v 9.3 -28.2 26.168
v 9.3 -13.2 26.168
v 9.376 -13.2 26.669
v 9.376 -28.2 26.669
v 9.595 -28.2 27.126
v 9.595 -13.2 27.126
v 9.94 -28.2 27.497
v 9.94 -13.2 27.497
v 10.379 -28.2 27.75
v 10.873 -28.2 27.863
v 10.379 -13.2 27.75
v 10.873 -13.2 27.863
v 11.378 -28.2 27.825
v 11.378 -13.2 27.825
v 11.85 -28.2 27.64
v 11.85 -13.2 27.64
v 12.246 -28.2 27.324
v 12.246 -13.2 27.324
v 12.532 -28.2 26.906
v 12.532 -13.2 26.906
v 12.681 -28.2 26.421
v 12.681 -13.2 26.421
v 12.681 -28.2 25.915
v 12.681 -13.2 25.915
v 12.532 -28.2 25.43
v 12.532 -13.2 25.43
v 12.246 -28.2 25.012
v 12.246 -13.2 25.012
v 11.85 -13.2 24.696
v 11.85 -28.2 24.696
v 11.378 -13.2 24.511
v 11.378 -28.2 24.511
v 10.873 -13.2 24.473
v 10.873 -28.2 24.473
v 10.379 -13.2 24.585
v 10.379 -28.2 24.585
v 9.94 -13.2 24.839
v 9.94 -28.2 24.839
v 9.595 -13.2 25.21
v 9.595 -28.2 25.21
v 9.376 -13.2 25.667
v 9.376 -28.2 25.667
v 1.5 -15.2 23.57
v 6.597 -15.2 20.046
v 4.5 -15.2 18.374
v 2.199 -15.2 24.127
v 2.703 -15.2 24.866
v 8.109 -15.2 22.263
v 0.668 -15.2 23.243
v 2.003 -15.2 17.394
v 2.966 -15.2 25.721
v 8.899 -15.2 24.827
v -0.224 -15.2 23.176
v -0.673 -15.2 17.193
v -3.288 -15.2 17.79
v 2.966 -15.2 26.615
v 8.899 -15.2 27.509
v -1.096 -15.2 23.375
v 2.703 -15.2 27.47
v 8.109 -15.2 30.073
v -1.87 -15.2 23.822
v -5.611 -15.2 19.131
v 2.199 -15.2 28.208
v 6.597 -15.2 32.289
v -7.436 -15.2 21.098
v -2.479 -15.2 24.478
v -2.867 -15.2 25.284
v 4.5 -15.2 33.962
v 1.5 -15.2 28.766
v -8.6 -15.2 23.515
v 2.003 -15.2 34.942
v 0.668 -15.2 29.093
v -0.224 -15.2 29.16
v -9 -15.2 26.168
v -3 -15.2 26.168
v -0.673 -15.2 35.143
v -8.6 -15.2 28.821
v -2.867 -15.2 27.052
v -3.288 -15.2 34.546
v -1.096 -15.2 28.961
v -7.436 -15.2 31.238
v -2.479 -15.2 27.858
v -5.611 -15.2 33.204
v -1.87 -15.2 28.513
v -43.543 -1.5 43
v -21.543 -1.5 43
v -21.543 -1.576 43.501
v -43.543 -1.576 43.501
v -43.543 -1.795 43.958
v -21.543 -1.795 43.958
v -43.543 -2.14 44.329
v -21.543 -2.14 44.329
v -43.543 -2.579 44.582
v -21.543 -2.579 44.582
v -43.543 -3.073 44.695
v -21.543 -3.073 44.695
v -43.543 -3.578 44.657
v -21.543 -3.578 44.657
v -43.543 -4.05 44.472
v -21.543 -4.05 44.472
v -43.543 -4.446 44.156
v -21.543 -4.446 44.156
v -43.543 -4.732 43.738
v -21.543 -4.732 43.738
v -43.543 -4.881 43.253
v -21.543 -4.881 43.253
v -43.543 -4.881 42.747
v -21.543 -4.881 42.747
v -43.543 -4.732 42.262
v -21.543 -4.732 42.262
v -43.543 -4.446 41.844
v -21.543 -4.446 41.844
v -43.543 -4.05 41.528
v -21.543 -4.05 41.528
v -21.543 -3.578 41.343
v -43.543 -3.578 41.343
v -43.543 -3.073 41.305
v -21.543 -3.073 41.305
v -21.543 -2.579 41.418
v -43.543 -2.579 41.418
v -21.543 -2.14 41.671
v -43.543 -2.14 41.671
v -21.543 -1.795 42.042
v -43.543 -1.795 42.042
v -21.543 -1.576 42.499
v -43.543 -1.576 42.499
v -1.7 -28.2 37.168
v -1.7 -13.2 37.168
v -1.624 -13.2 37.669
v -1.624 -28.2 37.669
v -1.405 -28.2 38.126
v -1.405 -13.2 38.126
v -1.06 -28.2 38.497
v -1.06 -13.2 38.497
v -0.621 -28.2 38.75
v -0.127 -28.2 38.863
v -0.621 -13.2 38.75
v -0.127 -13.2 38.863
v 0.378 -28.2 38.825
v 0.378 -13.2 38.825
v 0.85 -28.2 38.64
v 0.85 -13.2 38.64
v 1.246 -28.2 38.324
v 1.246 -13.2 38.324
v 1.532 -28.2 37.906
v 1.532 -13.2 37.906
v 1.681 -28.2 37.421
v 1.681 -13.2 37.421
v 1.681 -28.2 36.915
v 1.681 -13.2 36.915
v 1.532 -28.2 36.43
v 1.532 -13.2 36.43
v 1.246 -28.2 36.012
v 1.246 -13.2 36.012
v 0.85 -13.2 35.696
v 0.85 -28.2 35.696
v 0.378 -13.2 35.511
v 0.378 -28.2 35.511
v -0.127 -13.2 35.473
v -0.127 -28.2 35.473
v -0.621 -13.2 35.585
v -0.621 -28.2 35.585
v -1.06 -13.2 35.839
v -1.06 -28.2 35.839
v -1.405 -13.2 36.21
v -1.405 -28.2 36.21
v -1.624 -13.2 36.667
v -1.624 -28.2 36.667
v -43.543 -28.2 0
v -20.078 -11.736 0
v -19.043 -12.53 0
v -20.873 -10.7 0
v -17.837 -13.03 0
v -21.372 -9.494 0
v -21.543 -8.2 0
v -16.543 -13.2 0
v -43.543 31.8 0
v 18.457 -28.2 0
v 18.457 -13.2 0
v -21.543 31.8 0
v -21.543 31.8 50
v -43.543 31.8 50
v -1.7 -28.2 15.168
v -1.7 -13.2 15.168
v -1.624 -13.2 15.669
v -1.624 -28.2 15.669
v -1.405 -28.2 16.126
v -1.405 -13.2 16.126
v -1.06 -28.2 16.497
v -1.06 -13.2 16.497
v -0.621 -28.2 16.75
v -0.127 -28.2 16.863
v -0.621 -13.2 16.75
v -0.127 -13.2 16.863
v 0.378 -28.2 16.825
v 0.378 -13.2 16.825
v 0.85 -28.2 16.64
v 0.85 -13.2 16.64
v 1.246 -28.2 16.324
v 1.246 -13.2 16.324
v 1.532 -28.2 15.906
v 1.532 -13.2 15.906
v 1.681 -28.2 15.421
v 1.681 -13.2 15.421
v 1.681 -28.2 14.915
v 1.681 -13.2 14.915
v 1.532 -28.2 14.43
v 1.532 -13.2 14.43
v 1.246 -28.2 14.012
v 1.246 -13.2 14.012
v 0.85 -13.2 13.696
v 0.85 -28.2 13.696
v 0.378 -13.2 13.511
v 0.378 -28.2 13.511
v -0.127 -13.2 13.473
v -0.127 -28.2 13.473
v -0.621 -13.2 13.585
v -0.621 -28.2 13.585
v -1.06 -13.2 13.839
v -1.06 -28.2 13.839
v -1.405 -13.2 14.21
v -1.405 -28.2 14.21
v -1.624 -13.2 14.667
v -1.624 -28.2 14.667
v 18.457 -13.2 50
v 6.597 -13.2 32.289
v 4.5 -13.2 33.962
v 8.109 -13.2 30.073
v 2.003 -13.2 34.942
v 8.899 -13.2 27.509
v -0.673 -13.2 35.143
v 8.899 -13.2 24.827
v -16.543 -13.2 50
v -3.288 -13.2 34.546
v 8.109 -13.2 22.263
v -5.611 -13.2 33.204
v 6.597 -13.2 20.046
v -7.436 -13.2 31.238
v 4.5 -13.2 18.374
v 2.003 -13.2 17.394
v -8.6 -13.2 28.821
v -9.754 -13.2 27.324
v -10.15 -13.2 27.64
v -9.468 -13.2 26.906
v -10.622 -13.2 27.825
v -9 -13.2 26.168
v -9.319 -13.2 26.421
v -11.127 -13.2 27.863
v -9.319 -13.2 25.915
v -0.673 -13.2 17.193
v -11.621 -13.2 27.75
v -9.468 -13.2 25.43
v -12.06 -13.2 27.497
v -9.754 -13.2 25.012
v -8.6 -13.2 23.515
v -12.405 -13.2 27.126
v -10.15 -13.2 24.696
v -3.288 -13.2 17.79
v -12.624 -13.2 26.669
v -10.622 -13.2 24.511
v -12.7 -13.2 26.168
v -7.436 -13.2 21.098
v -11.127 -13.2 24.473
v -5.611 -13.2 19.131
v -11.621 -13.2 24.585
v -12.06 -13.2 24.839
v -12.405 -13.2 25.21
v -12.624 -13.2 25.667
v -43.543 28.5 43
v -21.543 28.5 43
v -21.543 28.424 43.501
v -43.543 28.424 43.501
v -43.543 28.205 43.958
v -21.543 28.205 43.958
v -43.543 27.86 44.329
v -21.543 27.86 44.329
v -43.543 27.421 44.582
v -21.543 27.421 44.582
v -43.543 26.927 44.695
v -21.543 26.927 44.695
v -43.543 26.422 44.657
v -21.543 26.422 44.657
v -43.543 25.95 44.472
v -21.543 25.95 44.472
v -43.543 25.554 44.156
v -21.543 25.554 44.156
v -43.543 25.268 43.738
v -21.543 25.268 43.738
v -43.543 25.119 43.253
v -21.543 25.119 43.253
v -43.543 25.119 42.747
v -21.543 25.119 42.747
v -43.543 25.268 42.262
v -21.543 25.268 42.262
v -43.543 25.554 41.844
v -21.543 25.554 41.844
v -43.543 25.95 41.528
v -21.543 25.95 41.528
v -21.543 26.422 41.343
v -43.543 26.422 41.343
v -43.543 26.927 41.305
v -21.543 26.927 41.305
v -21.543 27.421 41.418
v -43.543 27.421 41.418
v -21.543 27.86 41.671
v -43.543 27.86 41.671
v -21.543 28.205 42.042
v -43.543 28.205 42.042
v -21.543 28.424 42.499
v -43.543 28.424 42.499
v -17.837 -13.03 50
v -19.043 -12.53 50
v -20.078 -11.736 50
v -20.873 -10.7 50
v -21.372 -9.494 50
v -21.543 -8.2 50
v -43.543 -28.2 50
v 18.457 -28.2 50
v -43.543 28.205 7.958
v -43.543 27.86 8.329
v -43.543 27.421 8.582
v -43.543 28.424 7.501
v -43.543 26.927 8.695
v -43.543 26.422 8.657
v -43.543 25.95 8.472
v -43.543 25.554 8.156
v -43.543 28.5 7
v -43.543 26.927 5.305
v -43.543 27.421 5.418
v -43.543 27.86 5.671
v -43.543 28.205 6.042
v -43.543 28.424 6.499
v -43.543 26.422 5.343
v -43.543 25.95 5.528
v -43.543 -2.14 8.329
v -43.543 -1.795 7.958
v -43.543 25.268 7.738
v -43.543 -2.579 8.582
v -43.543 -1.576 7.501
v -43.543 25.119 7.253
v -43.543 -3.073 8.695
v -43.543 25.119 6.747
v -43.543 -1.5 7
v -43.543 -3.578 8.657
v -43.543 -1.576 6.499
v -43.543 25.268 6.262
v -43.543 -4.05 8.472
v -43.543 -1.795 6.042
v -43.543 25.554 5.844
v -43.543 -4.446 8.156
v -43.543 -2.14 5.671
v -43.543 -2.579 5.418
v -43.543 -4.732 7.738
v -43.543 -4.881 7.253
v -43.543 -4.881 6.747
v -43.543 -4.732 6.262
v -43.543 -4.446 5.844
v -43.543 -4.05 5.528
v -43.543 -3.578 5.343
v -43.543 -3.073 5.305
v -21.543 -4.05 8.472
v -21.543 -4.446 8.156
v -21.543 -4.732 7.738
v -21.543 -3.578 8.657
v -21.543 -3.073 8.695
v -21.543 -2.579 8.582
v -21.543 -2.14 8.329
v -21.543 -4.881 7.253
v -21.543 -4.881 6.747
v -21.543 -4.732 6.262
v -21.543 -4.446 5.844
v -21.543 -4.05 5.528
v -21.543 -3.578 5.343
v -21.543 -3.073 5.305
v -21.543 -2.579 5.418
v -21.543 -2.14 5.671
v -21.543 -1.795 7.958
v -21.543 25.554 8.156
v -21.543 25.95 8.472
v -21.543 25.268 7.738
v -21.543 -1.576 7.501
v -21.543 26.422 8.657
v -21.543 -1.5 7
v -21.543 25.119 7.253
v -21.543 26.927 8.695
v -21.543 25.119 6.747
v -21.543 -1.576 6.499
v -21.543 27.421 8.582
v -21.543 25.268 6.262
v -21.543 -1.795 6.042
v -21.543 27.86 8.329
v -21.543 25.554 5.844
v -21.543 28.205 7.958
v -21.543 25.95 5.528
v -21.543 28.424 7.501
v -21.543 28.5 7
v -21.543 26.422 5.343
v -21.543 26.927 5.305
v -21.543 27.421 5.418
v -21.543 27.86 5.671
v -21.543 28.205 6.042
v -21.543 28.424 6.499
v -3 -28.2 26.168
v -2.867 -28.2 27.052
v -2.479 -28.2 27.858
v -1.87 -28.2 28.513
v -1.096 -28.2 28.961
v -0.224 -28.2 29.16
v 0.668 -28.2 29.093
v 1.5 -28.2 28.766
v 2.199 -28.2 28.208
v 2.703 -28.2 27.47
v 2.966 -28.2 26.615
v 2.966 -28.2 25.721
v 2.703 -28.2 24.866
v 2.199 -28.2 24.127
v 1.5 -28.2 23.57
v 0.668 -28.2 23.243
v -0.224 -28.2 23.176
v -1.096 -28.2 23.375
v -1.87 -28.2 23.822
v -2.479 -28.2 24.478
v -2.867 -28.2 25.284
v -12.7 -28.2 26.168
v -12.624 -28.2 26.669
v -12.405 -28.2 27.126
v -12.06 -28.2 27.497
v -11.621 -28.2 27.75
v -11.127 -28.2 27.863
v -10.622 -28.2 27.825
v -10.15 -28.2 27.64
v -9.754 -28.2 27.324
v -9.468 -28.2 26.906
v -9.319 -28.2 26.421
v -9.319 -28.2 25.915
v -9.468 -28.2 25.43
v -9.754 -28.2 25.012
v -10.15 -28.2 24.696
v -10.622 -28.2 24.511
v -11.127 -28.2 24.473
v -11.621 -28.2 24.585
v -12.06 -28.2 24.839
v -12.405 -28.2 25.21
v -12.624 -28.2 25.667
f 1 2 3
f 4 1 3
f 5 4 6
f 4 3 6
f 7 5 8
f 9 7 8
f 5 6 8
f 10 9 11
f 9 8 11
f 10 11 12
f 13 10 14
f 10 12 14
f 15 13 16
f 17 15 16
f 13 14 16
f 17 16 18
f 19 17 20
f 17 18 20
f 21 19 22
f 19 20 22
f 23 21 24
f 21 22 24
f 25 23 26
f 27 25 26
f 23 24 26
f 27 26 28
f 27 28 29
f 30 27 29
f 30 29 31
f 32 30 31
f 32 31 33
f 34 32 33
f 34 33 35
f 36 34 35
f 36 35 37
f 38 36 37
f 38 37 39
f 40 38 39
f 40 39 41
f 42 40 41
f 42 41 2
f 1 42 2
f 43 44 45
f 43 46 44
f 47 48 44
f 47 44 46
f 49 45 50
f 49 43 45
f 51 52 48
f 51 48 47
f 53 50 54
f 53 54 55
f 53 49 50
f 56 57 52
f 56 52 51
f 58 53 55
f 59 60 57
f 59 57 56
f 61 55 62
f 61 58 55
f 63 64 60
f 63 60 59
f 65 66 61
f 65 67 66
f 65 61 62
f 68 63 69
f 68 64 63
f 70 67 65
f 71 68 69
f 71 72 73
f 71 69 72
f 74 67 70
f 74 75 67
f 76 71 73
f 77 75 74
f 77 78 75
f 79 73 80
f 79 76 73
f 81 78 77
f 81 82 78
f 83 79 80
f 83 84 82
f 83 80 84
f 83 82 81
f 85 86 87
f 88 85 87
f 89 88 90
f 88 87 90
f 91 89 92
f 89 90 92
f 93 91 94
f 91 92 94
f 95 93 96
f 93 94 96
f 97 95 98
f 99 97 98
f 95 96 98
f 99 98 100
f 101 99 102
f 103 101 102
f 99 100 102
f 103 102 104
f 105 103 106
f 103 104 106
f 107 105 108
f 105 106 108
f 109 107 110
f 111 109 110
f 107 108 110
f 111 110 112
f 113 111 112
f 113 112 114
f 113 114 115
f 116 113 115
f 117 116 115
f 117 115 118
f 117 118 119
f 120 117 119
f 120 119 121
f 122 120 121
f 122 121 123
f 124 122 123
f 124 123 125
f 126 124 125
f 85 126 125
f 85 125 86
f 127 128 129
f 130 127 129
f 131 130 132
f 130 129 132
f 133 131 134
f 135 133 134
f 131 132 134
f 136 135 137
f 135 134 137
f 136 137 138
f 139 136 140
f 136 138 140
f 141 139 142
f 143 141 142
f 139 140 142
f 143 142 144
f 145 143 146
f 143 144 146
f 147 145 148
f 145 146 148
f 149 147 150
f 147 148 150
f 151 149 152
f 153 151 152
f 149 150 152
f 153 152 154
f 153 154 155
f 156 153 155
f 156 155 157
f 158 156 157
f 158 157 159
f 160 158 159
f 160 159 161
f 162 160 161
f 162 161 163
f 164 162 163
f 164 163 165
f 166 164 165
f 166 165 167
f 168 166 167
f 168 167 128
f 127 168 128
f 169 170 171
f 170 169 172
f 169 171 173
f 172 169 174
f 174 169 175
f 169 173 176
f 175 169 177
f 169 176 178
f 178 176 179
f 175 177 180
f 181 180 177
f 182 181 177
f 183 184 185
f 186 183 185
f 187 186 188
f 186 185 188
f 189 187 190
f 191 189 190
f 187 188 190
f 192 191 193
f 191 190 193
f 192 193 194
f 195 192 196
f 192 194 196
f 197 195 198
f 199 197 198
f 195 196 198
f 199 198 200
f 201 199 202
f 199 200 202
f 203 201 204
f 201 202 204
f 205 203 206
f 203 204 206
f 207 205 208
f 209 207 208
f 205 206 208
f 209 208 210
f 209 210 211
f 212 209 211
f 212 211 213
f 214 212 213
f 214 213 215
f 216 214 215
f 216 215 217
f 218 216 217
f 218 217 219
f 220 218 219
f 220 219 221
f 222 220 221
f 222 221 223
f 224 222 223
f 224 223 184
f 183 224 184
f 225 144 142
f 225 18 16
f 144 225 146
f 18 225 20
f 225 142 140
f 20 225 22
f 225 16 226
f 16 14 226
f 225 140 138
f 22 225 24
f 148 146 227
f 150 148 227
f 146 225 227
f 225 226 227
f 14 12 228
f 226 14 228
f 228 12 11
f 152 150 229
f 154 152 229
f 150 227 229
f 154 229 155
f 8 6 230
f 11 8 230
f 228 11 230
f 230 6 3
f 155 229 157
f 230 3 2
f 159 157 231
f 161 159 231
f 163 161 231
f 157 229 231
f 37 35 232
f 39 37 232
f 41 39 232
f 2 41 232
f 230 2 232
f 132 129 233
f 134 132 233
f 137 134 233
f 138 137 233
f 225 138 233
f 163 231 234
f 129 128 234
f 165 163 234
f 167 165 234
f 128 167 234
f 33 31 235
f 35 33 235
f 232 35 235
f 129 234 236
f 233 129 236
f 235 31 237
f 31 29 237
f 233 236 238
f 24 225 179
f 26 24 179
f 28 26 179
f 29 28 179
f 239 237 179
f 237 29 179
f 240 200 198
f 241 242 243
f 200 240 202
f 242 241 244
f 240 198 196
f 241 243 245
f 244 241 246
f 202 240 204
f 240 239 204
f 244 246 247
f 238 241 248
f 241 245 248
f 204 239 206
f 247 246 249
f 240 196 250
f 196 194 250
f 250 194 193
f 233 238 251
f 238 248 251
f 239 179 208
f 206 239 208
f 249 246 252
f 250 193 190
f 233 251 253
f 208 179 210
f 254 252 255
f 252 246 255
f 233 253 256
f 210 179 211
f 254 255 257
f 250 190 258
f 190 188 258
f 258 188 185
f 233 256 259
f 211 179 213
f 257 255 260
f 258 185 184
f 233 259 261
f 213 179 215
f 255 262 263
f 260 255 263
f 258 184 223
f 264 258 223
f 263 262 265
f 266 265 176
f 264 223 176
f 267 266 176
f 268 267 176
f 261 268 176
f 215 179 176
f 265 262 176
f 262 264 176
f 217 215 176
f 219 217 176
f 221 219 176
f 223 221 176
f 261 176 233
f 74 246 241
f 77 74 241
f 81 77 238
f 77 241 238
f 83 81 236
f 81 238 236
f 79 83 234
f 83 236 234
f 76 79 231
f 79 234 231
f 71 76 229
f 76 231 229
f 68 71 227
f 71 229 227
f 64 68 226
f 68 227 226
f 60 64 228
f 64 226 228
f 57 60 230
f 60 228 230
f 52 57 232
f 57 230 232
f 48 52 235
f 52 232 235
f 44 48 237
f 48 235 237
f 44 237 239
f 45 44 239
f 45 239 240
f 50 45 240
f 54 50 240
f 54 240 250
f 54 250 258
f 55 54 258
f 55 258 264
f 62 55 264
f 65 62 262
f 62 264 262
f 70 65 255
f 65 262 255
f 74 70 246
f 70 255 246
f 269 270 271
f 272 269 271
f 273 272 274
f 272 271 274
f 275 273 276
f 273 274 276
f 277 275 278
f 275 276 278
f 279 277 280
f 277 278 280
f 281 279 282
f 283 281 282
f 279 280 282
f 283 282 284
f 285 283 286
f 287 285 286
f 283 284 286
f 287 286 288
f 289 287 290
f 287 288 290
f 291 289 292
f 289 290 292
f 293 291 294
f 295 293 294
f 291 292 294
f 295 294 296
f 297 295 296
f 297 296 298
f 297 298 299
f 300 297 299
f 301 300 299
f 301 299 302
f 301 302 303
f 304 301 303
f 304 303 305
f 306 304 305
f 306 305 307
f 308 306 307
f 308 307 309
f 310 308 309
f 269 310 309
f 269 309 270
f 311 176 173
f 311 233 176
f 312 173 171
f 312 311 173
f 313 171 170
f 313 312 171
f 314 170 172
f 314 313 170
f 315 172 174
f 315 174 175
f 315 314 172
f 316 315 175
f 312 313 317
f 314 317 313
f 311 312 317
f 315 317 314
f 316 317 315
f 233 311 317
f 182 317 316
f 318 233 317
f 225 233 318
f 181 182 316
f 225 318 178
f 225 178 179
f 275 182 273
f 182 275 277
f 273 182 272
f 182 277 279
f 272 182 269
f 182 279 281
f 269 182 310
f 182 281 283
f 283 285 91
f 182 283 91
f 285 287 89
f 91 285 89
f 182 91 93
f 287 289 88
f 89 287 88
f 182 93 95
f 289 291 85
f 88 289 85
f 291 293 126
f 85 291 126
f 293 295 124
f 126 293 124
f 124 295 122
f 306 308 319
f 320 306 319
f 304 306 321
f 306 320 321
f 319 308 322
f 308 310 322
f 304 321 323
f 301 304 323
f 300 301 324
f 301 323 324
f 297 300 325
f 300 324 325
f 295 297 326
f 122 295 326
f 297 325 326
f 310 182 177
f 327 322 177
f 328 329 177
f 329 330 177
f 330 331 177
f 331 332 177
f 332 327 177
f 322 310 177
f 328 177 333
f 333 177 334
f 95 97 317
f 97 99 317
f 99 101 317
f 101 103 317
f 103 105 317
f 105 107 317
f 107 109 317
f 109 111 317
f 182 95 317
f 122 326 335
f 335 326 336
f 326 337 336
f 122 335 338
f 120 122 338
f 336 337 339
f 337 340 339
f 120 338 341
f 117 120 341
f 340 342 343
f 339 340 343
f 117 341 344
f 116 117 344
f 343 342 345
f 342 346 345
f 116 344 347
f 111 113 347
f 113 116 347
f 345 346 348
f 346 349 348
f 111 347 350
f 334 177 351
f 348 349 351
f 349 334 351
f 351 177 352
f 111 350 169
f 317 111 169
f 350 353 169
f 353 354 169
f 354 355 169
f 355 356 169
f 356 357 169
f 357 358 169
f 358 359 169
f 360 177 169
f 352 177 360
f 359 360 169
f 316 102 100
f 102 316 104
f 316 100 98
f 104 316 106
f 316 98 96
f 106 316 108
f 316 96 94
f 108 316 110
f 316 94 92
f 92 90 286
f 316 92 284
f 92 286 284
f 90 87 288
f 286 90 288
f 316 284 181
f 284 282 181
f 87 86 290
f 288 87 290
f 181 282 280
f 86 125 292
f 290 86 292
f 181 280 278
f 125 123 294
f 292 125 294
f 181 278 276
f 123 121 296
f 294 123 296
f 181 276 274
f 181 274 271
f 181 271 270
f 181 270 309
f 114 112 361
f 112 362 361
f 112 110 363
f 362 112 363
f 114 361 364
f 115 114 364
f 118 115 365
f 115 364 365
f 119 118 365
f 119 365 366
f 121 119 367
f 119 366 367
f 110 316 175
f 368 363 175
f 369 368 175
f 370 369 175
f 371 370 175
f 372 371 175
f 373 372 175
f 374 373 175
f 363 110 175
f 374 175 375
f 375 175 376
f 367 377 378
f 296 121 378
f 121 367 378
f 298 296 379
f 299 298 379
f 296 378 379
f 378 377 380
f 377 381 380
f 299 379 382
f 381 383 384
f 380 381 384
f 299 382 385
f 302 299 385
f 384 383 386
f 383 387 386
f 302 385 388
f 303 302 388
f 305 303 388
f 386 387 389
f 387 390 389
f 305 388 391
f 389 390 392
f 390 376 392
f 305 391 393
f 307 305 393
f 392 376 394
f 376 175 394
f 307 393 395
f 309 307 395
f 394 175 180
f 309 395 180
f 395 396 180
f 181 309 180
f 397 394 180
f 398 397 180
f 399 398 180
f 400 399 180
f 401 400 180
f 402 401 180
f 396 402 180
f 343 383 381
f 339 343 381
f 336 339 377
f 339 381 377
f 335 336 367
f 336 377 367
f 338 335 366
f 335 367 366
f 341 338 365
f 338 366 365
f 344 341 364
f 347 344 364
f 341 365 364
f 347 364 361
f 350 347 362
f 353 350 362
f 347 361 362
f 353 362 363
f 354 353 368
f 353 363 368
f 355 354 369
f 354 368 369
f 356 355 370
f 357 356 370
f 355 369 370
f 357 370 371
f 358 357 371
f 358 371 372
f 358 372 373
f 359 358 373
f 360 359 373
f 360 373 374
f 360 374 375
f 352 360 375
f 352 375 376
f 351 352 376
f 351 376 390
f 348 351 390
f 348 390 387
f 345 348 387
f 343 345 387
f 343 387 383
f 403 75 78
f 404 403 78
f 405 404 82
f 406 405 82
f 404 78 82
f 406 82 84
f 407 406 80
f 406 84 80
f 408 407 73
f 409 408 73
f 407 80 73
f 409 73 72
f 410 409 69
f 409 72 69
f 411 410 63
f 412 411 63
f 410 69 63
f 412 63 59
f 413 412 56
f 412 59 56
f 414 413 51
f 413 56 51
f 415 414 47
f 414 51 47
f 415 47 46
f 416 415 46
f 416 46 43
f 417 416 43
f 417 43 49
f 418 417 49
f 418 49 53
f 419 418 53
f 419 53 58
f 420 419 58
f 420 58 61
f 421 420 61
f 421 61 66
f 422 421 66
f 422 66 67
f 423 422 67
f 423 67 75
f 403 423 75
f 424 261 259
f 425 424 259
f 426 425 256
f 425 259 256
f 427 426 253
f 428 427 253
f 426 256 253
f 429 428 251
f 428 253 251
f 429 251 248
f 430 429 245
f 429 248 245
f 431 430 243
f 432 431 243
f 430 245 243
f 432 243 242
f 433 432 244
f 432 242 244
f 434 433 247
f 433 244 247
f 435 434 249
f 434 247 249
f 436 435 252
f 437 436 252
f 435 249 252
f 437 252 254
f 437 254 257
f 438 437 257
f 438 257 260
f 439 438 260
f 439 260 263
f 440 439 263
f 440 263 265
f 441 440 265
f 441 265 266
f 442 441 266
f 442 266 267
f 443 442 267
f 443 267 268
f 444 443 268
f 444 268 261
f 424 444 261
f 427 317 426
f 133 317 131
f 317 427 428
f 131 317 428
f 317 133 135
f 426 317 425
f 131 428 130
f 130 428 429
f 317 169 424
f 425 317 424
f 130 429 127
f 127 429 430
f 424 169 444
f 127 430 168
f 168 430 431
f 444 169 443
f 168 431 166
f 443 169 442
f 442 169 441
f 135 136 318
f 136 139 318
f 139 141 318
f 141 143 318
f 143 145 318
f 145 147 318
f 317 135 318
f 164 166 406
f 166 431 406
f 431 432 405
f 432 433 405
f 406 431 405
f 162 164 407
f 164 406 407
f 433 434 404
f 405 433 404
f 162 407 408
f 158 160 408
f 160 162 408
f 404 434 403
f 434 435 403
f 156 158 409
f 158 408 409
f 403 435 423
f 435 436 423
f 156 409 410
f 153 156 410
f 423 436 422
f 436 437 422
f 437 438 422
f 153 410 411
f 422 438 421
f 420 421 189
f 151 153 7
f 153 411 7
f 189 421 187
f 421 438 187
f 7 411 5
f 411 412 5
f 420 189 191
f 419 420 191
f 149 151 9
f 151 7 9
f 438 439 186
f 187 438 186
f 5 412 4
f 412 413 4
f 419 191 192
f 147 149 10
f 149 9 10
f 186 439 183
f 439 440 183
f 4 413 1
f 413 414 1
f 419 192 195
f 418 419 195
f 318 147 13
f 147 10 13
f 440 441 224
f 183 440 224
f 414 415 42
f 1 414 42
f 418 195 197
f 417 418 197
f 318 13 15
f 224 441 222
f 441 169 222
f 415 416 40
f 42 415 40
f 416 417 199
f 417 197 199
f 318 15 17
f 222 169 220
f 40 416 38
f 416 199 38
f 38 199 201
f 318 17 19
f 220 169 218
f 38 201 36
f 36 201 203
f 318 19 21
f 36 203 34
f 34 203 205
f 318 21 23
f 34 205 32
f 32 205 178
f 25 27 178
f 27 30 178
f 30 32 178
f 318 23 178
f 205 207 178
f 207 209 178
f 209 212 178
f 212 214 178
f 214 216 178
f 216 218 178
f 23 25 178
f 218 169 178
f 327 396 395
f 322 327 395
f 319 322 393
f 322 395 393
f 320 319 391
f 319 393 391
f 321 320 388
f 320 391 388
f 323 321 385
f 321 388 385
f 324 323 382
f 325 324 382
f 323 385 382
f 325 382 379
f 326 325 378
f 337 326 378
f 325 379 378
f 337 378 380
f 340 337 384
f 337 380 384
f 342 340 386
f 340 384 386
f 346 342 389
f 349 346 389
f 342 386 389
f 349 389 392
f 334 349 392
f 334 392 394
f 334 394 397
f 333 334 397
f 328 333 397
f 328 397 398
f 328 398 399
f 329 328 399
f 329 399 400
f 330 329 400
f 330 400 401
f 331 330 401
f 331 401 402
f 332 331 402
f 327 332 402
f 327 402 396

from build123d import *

# Parameters (mm, degrees)
BOSS_EXTRUDE1_DEPTH = 50
FILLET1_R           = 5
SKETCH2_R           = 1.7
CUT_EXTRUDE1_DEPTH  = 50
SKETCH3_R           = 9
CUT_EXTRUDE4_DEPTH  = 2
SKETCH4_R           = 3
CUT_EXTRUDE5_DEPTH  = 15
SKETCH5_R           = 1.7
CUT_EXTRUDE6_DEPTH  = 81.131020262


with BuildPart() as part:
    # Sketch1 → Boss-Extrude1 (new body)
    with BuildSketch(Plane.XY):
        Polygon((-43.542857143, 31.8), (-43.542857143, -28.2), (18.457142857, -28.2), (18.457142857, -13.2), (-21.542857143, -13.2), (-21.542857143, 31.8), align=None)
    extrude(amount=BOSS_EXTRUDE1_DEPTH)

    # Fillet1
    fillet1_edges = [part.edges().sort_by_distance(p)[0] for p in [
        (-21.542857143, -13.2, 25),
    ]]
    fillet(fillet1_edges, radius=FILLET1_R)

    # Sketch2 → Cut-Extrude1 (cut)
    with BuildSketch(Plane(origin=(-21.542857143, 0, 0), x_dir=(0, 0, -1), z_dir=(1, 0, 0))):
        with Locations(Location((-43, 26.8, 0), (0, 0, 90))):
            Circle(SKETCH2_R)
        with Locations(Location((-7, 26.8, 0), (0, 0, 90))):
            Circle(SKETCH2_R)
        with Locations(Location((-7, -3.2, 0), (0, 0, 90))):
            Circle(SKETCH2_R)
        with Locations(Location((-43, -3.2, 0), (0, 0, 90))):
            Circle(SKETCH2_R)
    extrude(amount=-CUT_EXTRUDE1_DEPTH, mode=Mode.SUBTRACT)

    # Sketch3 → Cut-Extrude4 (cut)
    with BuildSketch(Plane(origin=(0, -13.2, 0), x_dir=(1, 0, 0), z_dir=(0, 1, 0))):
        with Locations(Location((0, -26.167935948, 0), (0, 0, 180))):
            Circle(SKETCH3_R)
    extrude(amount=-CUT_EXTRUDE4_DEPTH, mode=Mode.SUBTRACT)

    # Sketch4 → Cut-Extrude5 (cut)
    with BuildSketch(Plane(origin=(0, -13.2, 0), x_dir=(1, 0, 0), z_dir=(0, 1, 0))):
        with Locations(Location((0, -26.167935948, 0), (0, 0, 180))):
            Circle(SKETCH4_R)
    extrude(amount=-CUT_EXTRUDE5_DEPTH, mode=Mode.SUBTRACT)

    # Sketch5 → Cut-Extrude6 (cut, through all)
    with BuildSketch(Plane(origin=(0, -13.2, 0), x_dir=(1, 0, 0), z_dir=(0, 1, 0))):
        with Locations(Location((-11, -26.167935948, 0), (0, 0, 180))):
            Circle(SKETCH5_R)
        with Locations(Location((0, -15.167935948, 0), (0, 0, 180))):
            Circle(SKETCH5_R)
        with Locations(Location((11, -26.167935948, 0), (0, 0, 180))):
            Circle(SKETCH5_R)
        with Locations(Location((0, -37.167935948, 0), (0, 0, 180))):
            Circle(SKETCH5_R)
    extrude(amount=-CUT_EXTRUDE6_DEPTH, mode=Mode.SUBTRACT)


solid = part.part
